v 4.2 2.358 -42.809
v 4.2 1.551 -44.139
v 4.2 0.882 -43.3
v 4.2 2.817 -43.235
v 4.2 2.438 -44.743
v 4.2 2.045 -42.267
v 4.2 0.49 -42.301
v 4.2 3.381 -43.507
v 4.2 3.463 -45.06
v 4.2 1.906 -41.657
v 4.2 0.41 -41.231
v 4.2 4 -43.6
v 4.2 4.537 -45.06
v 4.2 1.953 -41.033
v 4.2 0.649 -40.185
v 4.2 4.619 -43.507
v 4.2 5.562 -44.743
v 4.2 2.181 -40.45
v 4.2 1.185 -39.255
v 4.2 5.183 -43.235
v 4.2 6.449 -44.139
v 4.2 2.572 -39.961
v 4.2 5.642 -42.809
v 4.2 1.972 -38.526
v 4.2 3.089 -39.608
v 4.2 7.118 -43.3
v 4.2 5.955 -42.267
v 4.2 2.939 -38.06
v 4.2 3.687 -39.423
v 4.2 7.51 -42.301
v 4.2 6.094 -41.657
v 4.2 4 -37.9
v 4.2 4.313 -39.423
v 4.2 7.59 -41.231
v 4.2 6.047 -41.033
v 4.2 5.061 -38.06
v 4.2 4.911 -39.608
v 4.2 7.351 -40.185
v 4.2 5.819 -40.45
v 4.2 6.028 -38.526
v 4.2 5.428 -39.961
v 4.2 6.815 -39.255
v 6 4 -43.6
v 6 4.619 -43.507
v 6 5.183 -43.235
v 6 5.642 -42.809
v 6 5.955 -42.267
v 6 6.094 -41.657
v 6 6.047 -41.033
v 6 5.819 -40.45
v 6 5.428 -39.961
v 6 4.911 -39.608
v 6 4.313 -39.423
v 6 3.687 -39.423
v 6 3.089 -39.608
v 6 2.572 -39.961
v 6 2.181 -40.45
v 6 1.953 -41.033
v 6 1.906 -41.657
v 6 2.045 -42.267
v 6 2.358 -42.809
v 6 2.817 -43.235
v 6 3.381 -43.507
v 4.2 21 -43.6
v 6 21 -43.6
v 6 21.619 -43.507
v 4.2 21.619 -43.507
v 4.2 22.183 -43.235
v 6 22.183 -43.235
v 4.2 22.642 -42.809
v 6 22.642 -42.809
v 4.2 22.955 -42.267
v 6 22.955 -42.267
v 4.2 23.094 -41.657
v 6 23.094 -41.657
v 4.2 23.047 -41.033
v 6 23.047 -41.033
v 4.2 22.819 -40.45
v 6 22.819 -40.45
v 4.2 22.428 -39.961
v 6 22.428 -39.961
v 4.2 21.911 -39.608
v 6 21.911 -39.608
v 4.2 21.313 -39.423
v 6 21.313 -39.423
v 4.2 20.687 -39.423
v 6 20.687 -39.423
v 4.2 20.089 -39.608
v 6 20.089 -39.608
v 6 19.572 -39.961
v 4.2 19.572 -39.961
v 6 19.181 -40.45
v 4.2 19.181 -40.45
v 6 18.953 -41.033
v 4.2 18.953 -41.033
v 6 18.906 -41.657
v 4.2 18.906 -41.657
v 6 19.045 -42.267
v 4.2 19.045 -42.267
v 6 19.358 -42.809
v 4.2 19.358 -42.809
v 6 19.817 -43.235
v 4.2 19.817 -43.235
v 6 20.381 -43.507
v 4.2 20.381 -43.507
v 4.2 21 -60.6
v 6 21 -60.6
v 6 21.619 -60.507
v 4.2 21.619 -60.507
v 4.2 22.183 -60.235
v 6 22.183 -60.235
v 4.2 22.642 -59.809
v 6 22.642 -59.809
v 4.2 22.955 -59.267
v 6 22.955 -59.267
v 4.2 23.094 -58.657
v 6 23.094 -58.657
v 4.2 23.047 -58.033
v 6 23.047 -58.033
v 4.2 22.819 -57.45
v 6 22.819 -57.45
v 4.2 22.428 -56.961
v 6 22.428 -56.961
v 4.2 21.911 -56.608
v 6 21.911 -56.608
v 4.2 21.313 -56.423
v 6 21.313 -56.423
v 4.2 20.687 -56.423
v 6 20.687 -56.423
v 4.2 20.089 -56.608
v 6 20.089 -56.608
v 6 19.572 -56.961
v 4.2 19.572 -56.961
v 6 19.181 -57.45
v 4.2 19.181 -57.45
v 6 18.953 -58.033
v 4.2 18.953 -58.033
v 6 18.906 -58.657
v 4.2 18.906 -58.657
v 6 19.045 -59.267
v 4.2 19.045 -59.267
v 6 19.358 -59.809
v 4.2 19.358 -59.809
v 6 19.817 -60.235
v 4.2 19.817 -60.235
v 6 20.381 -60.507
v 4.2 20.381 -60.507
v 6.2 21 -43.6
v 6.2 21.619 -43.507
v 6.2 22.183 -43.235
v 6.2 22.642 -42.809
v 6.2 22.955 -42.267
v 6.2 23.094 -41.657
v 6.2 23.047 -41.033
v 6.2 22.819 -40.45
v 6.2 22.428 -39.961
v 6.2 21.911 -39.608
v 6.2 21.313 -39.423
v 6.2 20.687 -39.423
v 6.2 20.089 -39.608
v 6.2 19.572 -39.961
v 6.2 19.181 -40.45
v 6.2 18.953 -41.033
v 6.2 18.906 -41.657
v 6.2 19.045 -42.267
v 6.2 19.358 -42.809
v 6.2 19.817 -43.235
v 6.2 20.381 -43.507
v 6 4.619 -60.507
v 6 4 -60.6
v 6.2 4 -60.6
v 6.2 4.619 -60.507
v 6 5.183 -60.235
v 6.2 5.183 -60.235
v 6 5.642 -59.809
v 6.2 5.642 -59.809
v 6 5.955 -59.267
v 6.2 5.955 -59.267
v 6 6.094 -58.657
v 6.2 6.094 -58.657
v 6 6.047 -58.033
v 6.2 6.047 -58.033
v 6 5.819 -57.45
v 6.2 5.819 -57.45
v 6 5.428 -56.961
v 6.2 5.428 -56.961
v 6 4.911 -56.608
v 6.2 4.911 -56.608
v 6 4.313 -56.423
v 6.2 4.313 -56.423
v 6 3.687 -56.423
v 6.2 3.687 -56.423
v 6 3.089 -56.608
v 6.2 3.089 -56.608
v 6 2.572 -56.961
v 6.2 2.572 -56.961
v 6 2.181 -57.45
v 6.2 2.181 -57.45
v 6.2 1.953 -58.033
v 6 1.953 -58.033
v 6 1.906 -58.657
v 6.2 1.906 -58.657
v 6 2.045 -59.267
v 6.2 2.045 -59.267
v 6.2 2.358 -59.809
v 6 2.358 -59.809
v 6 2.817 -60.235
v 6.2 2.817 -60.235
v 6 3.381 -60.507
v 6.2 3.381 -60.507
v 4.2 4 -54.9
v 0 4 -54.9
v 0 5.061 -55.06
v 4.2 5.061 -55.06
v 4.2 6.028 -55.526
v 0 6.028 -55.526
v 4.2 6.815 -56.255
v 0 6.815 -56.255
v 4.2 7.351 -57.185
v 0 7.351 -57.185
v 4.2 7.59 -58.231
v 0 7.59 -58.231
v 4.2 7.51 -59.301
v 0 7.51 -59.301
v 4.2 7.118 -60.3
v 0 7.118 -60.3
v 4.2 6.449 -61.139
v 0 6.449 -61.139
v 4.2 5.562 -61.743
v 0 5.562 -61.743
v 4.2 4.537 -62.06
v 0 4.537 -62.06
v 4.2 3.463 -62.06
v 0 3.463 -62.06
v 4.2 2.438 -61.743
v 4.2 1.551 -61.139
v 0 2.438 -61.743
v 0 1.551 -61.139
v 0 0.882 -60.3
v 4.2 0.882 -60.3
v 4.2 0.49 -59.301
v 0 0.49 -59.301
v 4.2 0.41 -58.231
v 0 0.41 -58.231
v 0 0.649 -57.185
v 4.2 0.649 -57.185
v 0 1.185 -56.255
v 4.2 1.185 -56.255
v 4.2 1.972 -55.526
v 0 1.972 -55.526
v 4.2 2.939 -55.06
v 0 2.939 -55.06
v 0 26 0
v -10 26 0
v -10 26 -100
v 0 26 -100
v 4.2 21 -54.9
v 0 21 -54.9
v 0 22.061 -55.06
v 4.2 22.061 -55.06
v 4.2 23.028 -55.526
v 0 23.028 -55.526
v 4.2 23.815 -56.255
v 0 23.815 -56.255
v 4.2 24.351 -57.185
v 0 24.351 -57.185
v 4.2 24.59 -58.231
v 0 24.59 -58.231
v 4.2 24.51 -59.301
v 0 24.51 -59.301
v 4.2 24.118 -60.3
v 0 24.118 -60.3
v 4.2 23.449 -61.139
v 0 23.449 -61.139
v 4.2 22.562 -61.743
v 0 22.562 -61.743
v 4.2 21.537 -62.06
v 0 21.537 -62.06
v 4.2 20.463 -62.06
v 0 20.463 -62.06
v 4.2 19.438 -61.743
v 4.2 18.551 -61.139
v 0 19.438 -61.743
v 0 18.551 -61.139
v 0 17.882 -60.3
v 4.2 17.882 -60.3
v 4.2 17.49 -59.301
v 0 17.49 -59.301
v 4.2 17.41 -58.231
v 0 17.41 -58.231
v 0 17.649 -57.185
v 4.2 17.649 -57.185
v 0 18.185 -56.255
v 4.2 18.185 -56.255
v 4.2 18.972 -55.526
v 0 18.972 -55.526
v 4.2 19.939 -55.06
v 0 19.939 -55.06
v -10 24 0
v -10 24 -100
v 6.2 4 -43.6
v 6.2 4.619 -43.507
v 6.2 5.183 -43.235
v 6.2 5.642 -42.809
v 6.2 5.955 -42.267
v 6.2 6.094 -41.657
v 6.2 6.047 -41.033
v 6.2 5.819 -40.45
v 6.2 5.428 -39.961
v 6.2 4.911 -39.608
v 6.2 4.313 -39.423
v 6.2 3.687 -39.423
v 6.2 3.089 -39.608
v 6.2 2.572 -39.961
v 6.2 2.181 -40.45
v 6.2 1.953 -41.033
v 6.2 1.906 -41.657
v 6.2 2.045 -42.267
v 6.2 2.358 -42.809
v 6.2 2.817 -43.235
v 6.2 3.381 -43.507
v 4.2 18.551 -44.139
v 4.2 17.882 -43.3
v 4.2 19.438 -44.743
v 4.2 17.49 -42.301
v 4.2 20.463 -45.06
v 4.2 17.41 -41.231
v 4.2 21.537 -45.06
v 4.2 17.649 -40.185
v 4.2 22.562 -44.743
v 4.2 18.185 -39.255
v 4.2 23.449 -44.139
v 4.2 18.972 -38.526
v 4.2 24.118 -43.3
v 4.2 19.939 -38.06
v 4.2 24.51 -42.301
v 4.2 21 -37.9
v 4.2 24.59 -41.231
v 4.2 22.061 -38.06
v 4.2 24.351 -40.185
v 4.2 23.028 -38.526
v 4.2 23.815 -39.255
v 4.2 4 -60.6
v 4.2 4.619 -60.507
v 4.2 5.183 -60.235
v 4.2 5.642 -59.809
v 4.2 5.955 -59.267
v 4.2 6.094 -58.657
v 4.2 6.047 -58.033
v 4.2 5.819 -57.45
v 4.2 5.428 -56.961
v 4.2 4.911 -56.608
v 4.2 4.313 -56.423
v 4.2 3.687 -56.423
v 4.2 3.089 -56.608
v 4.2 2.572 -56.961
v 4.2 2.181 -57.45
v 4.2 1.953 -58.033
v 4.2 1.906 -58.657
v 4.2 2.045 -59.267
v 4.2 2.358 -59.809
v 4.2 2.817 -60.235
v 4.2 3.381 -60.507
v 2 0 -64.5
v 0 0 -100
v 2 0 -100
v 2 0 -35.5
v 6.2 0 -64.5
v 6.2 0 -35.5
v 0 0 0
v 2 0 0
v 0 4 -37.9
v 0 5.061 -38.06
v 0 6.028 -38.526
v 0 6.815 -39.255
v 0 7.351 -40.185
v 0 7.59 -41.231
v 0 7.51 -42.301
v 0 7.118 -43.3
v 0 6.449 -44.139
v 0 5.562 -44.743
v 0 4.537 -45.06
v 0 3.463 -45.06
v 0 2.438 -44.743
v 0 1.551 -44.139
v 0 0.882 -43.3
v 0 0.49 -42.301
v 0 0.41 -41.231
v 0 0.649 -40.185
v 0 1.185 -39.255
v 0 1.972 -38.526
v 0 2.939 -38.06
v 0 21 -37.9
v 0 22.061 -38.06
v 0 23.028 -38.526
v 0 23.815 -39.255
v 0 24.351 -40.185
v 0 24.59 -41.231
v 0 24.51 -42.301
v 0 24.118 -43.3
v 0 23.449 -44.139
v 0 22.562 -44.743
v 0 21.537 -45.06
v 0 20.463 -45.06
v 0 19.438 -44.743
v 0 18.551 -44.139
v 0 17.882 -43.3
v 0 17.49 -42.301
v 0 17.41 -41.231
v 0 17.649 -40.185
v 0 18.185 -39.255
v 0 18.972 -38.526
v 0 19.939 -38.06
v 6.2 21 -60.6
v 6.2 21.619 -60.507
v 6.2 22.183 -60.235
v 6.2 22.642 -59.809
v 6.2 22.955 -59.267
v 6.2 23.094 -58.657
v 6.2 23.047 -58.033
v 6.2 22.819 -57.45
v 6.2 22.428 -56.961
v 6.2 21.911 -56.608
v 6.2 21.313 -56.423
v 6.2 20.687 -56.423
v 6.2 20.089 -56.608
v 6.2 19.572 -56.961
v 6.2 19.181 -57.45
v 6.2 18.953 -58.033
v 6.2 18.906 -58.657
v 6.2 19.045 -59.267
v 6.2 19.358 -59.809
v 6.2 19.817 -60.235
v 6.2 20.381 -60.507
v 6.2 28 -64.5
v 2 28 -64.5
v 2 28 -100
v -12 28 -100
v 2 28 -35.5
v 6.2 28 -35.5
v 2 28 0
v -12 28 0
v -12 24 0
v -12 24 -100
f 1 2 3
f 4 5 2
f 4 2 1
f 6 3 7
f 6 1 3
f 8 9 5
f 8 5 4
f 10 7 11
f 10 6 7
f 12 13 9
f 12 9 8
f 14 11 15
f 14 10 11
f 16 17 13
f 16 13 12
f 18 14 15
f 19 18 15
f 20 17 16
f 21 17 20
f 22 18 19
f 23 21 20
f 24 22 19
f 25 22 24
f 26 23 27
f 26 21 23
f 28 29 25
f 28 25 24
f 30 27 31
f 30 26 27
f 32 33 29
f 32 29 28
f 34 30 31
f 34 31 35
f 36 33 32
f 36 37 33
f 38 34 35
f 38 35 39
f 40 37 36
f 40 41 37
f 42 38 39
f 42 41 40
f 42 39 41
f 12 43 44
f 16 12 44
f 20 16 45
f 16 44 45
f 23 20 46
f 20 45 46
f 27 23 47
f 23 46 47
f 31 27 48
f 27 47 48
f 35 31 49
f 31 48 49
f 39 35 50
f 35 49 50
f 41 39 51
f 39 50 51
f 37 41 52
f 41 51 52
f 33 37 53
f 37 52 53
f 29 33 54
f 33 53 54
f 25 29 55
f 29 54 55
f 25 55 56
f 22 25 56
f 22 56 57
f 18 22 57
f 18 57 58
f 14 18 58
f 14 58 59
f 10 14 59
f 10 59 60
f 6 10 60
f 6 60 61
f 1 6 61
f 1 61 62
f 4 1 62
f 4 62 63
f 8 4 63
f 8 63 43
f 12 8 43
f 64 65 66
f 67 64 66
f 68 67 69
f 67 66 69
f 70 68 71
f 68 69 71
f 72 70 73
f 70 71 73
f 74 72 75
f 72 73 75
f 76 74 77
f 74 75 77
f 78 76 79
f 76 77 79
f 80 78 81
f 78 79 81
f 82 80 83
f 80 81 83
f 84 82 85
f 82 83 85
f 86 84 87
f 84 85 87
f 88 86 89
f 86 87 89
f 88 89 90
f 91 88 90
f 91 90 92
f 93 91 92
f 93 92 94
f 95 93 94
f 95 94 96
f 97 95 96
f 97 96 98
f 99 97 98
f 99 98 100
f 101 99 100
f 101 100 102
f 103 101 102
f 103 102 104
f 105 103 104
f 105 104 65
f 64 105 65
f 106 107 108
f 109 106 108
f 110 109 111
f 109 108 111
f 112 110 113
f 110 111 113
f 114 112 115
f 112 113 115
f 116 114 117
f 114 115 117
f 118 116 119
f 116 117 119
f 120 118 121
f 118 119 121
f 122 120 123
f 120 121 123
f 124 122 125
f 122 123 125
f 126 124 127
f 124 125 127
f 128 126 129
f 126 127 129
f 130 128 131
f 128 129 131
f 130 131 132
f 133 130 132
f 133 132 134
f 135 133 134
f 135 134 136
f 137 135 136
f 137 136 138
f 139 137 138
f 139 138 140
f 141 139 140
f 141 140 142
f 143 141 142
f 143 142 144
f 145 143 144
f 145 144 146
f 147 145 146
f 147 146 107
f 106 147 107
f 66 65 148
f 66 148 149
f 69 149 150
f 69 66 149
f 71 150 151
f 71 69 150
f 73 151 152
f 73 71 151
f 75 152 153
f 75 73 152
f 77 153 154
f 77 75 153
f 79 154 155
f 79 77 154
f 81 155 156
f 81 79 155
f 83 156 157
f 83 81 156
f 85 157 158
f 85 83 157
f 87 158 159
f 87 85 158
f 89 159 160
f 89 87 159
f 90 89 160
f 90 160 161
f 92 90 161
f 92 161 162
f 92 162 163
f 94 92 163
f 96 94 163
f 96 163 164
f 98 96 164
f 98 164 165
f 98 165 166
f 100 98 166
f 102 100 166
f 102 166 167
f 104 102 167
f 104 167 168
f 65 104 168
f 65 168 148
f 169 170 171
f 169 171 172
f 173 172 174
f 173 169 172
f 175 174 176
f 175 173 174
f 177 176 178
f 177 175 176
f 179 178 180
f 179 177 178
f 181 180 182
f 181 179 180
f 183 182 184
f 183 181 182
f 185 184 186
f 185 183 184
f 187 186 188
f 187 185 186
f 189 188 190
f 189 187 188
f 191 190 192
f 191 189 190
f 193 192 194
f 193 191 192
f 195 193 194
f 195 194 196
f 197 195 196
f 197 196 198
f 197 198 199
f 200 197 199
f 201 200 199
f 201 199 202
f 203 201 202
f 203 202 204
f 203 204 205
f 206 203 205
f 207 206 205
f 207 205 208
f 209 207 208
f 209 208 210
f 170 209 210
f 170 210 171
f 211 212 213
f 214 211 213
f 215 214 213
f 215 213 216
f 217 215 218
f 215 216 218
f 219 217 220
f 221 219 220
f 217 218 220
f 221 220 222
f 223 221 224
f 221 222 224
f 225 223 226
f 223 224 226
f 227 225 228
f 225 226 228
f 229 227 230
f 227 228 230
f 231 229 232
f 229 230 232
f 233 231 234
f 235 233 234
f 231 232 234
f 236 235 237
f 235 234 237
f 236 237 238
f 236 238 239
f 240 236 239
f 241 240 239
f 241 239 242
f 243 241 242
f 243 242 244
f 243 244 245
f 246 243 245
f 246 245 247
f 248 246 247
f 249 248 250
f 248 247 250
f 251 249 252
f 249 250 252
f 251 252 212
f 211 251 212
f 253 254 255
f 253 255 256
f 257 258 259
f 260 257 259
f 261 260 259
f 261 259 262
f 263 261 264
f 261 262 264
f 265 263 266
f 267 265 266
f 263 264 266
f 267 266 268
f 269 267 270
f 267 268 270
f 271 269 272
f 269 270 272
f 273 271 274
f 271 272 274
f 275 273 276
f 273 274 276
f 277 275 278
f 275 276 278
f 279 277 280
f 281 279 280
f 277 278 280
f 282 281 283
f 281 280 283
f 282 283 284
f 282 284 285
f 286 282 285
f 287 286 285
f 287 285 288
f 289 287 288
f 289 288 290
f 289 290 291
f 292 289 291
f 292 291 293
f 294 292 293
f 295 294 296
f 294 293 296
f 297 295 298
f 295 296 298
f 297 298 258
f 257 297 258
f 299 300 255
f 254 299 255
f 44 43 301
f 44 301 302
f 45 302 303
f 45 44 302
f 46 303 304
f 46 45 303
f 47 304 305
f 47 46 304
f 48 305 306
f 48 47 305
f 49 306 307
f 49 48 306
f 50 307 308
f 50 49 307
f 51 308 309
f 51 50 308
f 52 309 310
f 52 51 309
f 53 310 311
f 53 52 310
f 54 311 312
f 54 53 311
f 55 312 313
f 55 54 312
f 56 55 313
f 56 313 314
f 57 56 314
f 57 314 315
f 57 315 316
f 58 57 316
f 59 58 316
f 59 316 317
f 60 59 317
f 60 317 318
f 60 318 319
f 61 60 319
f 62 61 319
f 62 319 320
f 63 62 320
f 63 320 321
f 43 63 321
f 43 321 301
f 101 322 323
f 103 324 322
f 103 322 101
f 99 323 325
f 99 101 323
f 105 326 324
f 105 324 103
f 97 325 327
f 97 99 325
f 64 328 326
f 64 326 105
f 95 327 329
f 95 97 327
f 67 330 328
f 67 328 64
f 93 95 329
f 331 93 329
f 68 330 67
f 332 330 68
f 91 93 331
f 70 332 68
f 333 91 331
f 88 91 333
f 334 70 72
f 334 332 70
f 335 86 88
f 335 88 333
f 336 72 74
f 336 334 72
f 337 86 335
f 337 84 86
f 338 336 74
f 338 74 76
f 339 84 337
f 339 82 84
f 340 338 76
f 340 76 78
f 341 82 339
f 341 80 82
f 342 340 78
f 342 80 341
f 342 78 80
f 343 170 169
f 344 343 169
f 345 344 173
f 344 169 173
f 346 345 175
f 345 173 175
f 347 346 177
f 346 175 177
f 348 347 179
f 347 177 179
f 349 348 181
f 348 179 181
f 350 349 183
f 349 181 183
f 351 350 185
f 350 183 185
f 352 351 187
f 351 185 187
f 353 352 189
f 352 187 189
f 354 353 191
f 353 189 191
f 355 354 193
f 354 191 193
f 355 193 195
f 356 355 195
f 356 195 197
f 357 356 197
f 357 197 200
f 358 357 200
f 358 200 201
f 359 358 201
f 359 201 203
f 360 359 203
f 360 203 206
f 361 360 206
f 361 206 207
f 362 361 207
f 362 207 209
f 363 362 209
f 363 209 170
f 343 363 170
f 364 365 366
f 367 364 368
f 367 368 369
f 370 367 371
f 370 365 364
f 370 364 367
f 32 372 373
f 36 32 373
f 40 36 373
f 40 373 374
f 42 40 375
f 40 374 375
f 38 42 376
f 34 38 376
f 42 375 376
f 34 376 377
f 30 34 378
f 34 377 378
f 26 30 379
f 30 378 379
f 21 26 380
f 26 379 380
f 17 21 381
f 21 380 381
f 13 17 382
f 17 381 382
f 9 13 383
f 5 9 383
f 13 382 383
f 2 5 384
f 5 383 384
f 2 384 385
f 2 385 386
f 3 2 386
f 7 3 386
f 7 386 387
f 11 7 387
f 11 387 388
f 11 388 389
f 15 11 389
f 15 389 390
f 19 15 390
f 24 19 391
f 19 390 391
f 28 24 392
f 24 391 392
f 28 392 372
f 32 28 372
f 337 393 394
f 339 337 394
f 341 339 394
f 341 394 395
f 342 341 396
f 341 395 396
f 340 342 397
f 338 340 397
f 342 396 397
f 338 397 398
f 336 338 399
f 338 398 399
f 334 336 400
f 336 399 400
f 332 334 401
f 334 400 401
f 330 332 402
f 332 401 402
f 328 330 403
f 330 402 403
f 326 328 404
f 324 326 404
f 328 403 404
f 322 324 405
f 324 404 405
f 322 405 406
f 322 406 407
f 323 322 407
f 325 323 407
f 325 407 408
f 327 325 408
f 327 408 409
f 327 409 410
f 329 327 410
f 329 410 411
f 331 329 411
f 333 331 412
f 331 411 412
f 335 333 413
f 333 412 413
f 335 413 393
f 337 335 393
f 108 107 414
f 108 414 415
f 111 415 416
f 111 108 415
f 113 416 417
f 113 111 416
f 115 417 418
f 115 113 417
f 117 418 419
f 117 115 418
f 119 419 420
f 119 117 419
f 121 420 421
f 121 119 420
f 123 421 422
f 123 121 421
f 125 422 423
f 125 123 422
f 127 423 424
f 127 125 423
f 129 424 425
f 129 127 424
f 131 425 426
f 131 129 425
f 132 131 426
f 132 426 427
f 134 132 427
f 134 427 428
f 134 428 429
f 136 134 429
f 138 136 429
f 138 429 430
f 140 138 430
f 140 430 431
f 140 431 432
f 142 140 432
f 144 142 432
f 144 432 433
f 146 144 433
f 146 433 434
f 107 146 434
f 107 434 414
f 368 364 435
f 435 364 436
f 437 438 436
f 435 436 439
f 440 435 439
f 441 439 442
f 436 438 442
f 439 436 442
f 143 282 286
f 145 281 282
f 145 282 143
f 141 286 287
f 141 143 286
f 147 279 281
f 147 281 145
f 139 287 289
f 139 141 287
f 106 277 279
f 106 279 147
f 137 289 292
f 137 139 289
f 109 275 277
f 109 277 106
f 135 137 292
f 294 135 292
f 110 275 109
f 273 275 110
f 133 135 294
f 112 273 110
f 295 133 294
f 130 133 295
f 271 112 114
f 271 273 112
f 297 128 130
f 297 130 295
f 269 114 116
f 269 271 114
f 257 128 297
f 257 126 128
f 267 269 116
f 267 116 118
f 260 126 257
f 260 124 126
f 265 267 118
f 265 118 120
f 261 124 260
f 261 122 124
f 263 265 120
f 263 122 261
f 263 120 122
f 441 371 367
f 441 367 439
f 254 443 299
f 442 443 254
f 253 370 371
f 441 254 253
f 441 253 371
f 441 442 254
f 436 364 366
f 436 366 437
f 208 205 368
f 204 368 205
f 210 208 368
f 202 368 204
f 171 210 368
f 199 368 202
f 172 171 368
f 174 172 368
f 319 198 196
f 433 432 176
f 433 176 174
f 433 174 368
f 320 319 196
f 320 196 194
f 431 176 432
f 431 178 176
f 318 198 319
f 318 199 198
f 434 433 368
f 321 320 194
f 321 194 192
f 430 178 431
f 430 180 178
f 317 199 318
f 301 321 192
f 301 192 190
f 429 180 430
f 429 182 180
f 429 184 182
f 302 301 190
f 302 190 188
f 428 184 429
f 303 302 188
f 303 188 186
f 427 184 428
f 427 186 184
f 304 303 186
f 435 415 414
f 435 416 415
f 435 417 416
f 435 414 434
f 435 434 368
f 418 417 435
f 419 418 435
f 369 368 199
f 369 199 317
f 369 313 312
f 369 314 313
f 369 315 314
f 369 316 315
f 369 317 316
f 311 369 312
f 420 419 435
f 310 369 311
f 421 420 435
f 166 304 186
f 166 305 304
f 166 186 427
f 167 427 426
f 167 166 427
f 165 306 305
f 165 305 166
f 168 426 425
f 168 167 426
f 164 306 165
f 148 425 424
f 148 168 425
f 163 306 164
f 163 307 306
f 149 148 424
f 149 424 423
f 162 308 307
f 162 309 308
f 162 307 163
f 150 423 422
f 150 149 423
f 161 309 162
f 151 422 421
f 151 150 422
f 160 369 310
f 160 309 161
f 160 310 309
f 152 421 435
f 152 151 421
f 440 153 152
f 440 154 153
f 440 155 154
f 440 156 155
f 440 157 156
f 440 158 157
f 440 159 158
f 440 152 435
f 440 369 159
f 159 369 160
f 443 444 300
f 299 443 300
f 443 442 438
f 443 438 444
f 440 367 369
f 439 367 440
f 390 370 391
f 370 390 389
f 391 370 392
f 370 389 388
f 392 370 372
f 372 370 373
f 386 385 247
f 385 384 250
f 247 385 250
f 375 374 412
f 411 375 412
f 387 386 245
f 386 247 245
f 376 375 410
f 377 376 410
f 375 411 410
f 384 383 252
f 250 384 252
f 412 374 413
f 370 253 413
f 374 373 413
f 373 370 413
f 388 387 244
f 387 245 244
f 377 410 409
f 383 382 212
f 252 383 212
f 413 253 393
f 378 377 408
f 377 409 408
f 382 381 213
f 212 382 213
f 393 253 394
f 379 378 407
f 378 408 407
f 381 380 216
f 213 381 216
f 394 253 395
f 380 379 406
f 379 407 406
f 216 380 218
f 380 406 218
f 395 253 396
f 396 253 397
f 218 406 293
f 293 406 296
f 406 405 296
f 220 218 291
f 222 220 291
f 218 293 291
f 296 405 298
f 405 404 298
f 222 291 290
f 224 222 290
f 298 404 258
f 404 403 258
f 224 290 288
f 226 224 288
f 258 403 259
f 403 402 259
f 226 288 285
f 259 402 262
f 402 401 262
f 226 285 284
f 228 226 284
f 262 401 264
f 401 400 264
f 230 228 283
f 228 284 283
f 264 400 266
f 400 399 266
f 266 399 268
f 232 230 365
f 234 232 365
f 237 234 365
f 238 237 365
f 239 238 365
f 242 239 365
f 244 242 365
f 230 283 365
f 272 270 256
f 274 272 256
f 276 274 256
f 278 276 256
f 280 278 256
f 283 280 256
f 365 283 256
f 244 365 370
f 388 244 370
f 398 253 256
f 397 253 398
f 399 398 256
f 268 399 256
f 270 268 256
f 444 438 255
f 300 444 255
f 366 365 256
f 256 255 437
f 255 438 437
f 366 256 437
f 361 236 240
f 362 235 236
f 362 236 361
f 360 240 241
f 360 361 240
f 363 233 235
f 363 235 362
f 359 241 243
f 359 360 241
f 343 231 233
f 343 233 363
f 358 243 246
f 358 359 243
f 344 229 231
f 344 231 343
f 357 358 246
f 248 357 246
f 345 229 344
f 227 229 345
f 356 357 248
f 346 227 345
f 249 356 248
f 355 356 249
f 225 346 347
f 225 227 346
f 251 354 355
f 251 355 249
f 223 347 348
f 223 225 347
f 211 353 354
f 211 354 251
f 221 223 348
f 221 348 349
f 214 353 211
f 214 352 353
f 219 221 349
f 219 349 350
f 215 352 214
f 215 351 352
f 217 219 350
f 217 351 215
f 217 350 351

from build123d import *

# Parameters (mm, degrees)
SKETCH1_W           = 100
SKETCH1_H           = 26
BOSS_EXTRUDE1_DEPTH = 2
BOSS_EXTRUDE2_DEPTH = 100
SKETCH3_W           = 25
SKETCH3_H           = 28
BOSS_EXTRUDE3_DEPTH = 4
SKETCH4_R           = 2.1
CUT_EXTRUDE1_DEPTH  = 106.39449701
MOVE_FACE1_BY       = 2
MOVE_FACE1_2_BY     = 2
SKETCH5_R           = 3.6
CUT_EXTRUDE2_DEPTH  = 4.2
MOVE_FACE2_BY       = 4
MOVE_FACE3_BY       = 3.8


with BuildPart() as part:
    # Sketch1 → Boss-Extrude1 (new body)
    with BuildSketch(Plane(origin=(0, 0, 0), x_dir=(0, 0, -1), z_dir=(1, 0, 0))):
        with Locations((50, 13)):
            Rectangle(SKETCH1_W, SKETCH1_H)
    extrude(amount=BOSS_EXTRUDE1_DEPTH)

    # Sketch2 → Boss-Extrude2 (add)
    with BuildSketch(Plane.XY):
        Polygon((2, 26), (2, 28), (-12, 28), (-12, 24), (-10, 24), (-10, 26), align=None)
    extrude(amount=-BOSS_EXTRUDE2_DEPTH)

    # Sketch3 → Boss-Extrude3 (add)
    with BuildSketch(Plane(origin=(2, 0, 0), x_dir=(0, 0, -1), z_dir=(1, 0, 0))):
        with Locations((50, 14)):
            Rectangle(SKETCH3_W, SKETCH3_H)
    extrude(amount=BOSS_EXTRUDE3_DEPTH)

    # Sketch4 → Cut-Extrude1 (cut, through all)
    with BuildSketch(Plane(origin=(6, 0, 0), x_dir=(0, 0, -1), z_dir=(1, 0, 0))):
        with Locations((41.5, 21)):
            Circle(SKETCH4_R)
        with Locations((58.5, 21)):
            Circle(SKETCH4_R)
        with Locations((58.5, 4)):
            Circle(SKETCH4_R)
        with Locations((41.5, 4)):
            Circle(SKETCH4_R)
    extrude(amount=-CUT_EXTRUDE1_DEPTH, mode=Mode.SUBTRACT)

    # Move Face1: a face moved outward by 2.0
    extrude(part.faces().sort_by_distance((4, 14, -37.5))[0], amount=MOVE_FACE1_BY, dir=(0, 0, 1))

    # Move Face1 2: a face moved outward by 2.0
    extrude(part.faces().sort_by_distance((4, 14, -62.5))[0], amount=MOVE_FACE1_2_BY, dir=(0, 0, -1))

    # Sketch5 → Cut-Extrude2 (cut)
    with BuildSketch(Plane.ZY):
        with Locations((-58.5, 21)):
            Circle(SKETCH5_R)
        with Locations((-41.5, 21)):
            Circle(SKETCH5_R)
        with Locations((-41.5, 4)):
            Circle(SKETCH5_R)
        with Locations((-58.5, 4)):
            Circle(SKETCH5_R)
    extrude(amount=-CUT_EXTRUDE2_DEPTH, mode=Mode.SUBTRACT)

    # Move Face2: a face moved outward by 4.0
    extrude(part.faces().sort_by_distance((6, 14.109871115, -50))[0], amount=MOVE_FACE2_BY, dir=(1, 0, 0))

    # Move Face3: a face moved inward by 3.8
    extrude(part.faces().sort_by_distance((10, 14.109871115, -50))[0], amount=MOVE_FACE3_BY, dir=(-1, 0, 0), mode=Mode.SUBTRACT)


solid = part.part
